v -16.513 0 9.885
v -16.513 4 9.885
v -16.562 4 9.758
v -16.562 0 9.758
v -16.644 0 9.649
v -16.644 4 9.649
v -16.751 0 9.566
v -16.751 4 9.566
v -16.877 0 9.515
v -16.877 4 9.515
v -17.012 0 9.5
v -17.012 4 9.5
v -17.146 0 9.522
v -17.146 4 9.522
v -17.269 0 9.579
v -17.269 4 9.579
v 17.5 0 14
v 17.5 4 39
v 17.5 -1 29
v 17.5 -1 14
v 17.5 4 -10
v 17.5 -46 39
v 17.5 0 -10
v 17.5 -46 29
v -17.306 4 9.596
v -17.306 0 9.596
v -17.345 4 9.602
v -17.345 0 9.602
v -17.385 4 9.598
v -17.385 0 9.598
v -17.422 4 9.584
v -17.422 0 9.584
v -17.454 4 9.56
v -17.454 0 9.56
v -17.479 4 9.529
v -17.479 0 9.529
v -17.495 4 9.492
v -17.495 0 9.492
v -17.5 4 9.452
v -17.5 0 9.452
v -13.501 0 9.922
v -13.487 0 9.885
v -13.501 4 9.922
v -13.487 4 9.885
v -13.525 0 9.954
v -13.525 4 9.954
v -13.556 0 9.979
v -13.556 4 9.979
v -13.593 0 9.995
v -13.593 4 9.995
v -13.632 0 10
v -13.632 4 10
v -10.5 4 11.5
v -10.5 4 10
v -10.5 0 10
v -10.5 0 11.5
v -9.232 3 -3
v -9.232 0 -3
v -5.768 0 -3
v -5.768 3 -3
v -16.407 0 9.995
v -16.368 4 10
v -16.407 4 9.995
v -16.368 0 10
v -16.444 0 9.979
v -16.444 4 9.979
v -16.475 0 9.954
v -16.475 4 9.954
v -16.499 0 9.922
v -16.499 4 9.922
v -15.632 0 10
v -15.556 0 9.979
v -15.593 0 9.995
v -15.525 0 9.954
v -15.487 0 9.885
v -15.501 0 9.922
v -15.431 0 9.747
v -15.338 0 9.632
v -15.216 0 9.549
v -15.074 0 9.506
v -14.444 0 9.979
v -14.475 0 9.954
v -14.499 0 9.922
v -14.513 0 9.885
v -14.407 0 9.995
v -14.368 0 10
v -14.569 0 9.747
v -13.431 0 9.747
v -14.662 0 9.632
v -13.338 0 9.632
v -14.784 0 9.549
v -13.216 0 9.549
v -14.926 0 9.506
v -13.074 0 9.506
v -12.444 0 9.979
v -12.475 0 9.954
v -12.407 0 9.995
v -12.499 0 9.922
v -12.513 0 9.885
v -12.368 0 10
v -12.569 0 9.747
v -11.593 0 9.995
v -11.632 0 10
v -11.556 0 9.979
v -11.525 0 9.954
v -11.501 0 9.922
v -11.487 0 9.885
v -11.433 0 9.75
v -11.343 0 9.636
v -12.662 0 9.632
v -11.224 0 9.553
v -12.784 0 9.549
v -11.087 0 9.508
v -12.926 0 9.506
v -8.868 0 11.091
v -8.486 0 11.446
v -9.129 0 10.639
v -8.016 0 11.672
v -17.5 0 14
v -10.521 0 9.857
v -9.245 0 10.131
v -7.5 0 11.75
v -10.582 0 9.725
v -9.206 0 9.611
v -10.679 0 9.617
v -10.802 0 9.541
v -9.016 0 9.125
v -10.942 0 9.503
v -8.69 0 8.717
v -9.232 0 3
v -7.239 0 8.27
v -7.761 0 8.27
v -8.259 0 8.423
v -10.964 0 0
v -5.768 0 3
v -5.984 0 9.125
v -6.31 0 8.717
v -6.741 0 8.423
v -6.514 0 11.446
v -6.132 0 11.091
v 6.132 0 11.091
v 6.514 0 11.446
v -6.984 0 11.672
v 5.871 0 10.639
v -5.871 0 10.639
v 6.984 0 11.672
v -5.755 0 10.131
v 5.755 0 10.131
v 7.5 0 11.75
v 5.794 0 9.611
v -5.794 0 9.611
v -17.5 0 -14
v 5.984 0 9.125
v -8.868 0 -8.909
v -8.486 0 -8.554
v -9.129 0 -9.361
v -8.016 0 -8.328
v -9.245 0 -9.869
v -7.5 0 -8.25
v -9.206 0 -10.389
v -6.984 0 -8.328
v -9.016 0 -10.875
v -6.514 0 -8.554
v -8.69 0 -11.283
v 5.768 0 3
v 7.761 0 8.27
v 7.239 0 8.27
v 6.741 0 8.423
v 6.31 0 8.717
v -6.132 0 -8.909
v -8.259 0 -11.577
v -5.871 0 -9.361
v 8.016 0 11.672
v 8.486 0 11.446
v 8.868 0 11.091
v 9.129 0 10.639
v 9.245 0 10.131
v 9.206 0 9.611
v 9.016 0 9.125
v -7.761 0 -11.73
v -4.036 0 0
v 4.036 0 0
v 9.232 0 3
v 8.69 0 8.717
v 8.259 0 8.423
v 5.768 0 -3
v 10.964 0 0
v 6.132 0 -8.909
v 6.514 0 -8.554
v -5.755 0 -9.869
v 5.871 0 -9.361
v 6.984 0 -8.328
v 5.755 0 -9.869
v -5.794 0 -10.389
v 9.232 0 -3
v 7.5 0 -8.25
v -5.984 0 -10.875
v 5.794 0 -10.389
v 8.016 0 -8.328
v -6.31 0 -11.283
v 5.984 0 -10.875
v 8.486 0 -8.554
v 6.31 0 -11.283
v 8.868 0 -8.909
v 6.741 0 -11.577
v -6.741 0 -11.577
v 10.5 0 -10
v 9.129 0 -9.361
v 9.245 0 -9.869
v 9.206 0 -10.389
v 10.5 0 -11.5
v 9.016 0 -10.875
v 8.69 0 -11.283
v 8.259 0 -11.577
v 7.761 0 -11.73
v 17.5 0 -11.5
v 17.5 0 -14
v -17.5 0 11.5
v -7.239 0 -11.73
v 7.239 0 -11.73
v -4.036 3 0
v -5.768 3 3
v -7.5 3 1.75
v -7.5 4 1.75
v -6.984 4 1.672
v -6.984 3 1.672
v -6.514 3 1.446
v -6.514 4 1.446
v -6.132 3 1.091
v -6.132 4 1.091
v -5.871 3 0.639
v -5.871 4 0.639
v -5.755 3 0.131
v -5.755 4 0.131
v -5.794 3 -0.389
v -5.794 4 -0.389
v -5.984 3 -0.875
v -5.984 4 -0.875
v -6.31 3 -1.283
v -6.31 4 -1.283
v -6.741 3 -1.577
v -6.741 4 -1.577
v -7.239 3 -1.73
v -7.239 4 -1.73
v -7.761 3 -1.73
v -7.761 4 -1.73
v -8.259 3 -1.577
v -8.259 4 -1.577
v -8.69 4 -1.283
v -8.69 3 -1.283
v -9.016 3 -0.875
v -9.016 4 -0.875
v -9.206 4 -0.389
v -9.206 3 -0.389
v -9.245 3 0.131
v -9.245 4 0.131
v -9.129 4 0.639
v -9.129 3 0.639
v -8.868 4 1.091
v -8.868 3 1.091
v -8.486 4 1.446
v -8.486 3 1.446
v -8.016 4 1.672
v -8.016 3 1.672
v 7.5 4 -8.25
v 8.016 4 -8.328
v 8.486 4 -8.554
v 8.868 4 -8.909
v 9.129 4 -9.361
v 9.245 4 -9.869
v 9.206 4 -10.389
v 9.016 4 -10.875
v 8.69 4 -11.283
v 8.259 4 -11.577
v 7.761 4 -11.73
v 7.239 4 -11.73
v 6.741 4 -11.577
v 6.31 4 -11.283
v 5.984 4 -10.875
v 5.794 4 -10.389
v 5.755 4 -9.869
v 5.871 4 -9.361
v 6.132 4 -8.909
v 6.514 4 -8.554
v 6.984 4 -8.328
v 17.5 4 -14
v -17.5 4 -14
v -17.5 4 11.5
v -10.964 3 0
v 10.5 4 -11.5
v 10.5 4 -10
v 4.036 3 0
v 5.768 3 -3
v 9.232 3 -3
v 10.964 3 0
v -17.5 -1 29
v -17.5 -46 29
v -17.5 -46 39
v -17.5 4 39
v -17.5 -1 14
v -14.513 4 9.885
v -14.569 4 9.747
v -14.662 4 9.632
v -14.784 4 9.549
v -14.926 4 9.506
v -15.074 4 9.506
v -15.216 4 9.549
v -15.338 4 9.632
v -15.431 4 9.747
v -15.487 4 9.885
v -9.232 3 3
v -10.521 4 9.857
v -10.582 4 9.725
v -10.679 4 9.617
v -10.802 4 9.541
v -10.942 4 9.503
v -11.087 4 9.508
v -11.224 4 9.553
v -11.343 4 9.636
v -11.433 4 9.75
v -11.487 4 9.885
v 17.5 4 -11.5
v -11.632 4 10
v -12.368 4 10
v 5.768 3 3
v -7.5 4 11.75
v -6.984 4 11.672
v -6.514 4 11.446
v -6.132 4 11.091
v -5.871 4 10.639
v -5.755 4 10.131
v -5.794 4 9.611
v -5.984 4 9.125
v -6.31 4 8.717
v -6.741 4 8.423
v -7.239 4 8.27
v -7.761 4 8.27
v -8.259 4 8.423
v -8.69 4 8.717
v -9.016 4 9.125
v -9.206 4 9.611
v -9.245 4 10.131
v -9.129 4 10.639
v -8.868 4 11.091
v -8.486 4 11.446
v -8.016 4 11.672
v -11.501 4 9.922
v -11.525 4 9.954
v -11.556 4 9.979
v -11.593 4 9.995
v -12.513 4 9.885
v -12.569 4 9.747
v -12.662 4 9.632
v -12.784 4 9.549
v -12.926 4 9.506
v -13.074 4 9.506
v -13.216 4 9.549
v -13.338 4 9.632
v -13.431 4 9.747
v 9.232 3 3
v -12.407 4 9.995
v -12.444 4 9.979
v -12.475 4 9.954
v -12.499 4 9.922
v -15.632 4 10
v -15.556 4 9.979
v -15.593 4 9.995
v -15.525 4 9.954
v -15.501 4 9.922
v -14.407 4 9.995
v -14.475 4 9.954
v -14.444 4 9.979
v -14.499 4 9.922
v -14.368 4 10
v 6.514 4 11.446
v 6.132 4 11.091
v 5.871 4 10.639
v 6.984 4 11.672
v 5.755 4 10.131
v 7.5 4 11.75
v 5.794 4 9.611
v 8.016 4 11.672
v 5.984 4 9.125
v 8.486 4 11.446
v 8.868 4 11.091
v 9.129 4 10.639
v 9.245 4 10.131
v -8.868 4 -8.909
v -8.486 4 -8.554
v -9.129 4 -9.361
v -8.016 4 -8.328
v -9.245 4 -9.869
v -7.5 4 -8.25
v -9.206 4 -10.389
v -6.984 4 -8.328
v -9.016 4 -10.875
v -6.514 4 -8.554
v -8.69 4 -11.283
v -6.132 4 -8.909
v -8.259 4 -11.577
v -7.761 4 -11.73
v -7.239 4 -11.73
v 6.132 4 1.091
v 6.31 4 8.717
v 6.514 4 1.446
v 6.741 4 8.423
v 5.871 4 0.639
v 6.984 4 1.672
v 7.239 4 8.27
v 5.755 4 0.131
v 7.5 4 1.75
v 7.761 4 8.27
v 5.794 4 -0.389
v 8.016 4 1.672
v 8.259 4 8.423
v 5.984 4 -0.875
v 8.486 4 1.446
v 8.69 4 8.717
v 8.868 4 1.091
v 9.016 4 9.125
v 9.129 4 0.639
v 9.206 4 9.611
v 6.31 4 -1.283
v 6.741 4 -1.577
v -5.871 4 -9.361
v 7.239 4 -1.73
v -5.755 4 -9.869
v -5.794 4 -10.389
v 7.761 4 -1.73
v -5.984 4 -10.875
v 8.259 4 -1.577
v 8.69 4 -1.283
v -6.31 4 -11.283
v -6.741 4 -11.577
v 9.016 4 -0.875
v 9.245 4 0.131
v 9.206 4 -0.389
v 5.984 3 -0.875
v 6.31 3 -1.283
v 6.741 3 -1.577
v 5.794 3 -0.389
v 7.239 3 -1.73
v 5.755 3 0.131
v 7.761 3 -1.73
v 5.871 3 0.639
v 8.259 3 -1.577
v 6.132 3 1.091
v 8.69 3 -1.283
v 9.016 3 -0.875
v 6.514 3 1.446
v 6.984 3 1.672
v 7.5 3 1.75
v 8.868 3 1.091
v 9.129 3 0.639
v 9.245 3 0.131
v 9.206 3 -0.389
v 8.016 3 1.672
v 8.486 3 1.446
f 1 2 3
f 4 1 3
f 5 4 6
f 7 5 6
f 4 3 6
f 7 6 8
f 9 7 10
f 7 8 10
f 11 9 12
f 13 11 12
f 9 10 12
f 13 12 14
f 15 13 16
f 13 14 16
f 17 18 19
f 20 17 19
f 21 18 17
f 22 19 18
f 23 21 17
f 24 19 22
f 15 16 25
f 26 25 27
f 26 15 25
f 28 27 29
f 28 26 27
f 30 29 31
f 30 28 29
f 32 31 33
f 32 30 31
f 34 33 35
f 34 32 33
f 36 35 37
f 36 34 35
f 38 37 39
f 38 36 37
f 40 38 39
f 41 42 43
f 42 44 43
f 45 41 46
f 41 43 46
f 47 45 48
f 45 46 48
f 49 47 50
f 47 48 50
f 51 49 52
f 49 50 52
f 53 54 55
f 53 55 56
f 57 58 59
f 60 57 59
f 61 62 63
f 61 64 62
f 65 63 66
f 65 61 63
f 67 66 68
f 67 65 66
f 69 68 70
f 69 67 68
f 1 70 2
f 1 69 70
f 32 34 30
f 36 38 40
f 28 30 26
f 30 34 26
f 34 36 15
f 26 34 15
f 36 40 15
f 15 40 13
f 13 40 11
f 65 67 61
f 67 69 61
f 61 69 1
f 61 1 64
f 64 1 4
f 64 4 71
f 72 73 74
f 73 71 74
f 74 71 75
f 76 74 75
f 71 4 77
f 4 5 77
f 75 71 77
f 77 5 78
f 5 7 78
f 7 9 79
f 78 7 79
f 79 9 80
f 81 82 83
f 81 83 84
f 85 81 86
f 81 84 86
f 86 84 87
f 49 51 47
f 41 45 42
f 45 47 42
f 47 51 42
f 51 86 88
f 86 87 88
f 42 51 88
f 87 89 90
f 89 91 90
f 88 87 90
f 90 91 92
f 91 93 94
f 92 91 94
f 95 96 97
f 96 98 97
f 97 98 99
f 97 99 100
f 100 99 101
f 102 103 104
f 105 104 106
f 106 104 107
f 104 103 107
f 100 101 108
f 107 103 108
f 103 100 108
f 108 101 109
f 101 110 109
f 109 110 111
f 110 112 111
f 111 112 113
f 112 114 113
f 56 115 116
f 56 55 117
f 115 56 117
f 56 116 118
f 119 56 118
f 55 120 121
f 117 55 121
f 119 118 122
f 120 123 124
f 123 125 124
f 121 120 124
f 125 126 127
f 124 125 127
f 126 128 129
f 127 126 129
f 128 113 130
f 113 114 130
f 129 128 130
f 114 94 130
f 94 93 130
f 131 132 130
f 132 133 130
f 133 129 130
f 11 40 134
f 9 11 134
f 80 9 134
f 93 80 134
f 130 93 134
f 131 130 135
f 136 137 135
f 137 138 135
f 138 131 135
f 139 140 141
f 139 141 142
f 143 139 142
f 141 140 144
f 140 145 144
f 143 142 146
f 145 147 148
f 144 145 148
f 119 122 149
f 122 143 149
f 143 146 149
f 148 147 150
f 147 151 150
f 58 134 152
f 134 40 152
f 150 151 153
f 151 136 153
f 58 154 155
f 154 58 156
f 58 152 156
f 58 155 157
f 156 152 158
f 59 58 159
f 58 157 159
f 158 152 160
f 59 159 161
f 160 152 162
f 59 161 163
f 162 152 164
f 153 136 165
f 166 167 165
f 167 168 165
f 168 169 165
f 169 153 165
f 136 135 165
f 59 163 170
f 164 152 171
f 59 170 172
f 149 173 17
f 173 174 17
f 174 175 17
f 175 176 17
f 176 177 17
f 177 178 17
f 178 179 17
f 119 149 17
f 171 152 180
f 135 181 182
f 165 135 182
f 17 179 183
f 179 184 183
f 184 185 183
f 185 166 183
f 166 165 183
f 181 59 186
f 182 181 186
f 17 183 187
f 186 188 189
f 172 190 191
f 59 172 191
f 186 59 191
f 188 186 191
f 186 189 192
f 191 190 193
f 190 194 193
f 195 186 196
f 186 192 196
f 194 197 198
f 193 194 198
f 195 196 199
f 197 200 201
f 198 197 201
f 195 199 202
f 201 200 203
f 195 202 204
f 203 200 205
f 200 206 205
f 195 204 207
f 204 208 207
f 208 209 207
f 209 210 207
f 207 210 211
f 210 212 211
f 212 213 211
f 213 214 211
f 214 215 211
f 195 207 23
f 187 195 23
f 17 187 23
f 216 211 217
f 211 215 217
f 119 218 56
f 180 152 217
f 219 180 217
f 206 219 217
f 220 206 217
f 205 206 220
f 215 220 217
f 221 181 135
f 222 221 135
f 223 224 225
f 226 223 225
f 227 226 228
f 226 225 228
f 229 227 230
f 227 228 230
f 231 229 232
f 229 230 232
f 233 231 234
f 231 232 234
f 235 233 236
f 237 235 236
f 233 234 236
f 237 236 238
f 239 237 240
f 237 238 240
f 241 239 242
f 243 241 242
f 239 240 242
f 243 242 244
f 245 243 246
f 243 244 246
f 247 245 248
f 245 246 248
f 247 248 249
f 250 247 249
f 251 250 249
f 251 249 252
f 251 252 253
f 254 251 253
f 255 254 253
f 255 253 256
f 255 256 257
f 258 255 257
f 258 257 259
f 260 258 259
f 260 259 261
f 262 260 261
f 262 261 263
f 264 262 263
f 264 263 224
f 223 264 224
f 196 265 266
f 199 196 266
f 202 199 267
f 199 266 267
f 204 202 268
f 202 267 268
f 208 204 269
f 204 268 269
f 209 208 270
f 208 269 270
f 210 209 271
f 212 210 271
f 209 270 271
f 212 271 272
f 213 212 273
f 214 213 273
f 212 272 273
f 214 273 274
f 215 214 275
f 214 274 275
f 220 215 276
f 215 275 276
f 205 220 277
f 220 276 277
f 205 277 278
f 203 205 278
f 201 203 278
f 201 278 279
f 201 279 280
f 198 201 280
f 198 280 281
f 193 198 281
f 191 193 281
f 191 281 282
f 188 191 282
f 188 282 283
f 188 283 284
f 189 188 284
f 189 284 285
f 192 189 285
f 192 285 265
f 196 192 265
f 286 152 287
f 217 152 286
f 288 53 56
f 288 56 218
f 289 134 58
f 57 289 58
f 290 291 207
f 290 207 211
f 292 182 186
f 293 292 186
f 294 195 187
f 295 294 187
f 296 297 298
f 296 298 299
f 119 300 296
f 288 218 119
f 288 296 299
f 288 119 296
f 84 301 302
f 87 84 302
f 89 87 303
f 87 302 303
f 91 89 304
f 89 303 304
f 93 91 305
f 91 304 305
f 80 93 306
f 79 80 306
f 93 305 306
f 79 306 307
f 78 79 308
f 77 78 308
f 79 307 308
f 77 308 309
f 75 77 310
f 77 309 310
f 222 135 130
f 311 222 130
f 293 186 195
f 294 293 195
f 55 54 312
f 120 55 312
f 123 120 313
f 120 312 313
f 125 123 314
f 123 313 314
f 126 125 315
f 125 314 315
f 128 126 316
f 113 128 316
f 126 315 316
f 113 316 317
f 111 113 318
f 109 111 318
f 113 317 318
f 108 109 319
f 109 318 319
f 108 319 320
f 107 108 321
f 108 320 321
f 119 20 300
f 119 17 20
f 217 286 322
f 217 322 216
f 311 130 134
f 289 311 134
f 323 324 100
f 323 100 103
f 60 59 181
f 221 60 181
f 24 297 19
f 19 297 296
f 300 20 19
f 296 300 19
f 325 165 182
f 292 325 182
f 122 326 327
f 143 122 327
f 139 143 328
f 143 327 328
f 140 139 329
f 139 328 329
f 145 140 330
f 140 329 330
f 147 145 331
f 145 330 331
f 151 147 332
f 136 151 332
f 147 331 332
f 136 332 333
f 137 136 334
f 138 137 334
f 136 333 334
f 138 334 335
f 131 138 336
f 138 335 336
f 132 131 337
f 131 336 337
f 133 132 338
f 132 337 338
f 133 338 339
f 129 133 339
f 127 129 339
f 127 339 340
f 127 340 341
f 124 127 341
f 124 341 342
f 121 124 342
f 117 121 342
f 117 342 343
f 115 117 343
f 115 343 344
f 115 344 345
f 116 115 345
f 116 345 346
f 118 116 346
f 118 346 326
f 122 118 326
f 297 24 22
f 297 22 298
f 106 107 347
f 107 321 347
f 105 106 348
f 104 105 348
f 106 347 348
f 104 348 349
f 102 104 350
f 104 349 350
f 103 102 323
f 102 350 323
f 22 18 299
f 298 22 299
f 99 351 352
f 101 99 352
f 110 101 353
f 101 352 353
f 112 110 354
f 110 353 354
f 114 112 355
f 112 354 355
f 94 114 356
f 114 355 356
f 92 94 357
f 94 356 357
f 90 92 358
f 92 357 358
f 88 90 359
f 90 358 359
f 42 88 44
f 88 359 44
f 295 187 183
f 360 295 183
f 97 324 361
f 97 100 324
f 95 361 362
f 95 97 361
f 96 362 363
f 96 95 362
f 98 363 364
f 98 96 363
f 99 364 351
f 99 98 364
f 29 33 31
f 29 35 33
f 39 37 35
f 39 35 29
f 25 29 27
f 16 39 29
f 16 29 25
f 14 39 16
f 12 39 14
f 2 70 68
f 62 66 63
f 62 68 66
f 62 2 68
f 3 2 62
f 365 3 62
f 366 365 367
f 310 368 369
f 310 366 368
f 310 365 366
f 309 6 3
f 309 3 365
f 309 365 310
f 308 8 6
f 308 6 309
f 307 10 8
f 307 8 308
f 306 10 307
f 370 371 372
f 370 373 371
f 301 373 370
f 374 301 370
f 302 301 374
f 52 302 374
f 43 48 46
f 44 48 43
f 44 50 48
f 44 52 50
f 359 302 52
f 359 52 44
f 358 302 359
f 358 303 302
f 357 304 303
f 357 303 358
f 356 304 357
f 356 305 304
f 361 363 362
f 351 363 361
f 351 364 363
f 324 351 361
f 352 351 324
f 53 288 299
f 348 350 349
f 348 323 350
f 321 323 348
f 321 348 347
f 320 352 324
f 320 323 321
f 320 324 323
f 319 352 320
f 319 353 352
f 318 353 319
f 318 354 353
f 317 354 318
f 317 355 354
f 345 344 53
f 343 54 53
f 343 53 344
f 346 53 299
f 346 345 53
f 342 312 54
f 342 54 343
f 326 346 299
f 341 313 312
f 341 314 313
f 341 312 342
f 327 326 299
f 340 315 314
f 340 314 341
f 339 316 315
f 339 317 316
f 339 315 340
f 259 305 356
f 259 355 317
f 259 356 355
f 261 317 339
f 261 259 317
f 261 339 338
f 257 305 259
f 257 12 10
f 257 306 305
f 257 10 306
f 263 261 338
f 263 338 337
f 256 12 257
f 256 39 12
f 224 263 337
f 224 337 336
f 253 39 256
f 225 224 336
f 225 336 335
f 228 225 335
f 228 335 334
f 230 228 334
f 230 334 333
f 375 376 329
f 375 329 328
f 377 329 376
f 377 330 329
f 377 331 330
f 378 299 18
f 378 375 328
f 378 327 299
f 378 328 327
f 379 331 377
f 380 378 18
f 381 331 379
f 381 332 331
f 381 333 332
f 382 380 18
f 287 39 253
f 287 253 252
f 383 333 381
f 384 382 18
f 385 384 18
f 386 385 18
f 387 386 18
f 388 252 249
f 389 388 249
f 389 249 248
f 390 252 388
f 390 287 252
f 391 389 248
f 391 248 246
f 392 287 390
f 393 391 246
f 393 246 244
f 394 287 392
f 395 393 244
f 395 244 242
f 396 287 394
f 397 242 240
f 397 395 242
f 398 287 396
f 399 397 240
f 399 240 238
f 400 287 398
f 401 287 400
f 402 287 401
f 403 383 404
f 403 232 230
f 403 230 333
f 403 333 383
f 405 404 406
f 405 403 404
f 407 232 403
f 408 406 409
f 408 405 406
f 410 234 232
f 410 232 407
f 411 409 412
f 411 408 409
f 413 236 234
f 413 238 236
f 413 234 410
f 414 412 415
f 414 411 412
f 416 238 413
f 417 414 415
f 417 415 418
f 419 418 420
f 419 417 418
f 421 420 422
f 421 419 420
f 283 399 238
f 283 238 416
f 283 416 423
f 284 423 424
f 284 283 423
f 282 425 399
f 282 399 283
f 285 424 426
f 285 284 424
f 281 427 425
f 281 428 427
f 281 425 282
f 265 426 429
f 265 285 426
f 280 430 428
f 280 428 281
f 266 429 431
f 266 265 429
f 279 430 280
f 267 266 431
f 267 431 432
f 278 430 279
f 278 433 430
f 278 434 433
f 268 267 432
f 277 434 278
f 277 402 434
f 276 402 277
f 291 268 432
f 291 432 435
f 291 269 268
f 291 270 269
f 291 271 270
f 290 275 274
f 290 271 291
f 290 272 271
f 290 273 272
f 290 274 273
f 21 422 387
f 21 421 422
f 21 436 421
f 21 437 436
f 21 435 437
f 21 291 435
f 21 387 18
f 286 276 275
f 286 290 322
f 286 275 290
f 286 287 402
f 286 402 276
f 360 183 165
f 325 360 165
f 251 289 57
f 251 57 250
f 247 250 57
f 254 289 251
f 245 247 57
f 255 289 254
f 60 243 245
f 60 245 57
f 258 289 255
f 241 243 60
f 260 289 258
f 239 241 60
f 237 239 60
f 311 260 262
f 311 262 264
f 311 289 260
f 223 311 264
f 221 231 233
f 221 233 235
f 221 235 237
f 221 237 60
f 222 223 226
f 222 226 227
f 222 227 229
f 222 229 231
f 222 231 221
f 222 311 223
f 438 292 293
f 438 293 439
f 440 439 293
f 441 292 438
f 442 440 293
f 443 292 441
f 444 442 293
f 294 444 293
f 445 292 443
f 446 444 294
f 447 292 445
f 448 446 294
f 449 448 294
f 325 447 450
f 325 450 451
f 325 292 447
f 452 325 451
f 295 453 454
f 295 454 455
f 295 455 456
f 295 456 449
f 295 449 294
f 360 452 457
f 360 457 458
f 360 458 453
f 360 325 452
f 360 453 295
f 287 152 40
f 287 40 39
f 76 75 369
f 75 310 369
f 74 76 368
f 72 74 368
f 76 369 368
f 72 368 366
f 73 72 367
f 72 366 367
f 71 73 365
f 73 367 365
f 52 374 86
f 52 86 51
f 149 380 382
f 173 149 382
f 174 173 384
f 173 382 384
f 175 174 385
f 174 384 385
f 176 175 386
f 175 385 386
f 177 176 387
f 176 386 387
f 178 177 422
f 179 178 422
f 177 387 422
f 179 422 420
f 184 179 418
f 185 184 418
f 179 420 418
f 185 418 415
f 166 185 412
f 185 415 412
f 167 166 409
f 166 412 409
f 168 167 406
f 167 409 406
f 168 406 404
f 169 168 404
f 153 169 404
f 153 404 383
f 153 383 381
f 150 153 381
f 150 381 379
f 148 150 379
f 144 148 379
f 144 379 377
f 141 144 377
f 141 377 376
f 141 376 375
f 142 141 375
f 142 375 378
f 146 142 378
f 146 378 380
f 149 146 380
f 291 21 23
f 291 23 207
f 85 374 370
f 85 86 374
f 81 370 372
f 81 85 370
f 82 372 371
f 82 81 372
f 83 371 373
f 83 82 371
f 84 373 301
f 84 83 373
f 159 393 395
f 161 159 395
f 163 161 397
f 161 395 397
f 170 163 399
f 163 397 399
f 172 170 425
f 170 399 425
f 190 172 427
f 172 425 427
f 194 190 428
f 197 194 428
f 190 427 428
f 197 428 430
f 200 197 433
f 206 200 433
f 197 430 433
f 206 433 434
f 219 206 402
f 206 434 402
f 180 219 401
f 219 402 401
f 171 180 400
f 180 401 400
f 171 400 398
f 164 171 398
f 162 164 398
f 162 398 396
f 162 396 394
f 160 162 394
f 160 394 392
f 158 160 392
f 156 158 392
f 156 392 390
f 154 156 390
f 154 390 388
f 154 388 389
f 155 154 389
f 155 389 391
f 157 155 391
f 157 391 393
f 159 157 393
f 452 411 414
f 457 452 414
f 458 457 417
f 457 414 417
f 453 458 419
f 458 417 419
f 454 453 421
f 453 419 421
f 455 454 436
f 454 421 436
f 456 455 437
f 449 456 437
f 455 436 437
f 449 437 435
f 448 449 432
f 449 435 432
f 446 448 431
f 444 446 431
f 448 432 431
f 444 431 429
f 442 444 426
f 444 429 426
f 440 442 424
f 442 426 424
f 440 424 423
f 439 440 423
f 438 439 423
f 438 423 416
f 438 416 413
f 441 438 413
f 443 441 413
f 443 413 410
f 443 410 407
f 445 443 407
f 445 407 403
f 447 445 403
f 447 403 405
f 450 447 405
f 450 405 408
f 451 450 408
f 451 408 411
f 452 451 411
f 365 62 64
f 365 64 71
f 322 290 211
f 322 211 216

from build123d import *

# Parameters (mm, degrees)
SKETCH1_W           = 35
SKETCH1_H           = 28.000000000000004
BOSS_EXTRUDE1_DEPTH = 4
SKETCH2_R           = 1.7499999999999998
CUT_EXTRUDE1_DEPTH  = 23.765104875664424
BOSS_EXTRUDE2_DEPTH = 25
CUT_EXTRUDE14_DEPTH = 66.78183639881149
SKETCH19_R          = 1.75
CUT_EXTRUDE15_DEPTH = 66.78183639881149
CUT_EXTRUDE16_DEPTH = 2.999999999999999
SKETCH21_R          = 0.49999999999999917
CUT_EXTRUDE17_DEPTH = 3.999999999999999
LPATTERN2_COUNT     = 4
LPATTERN2_PITCH     = 2
FILLET2_R           = 0.15
SKETCH22_W          = 14.999999999999995
SKETCH22_H          = 45
CUT_EXTRUDE18_DEPTH = 70.72804313904126


with BuildPart() as part:
    # Sketch1 → Boss-Extrude1 (new body)
    with BuildSketch(Plane(origin=(0, 0, 0), x_dir=(1, 0, 0), z_dir=(0, 1, 0))):
        Rectangle(SKETCH1_W, SKETCH1_H)
    extrude(amount=BOSS_EXTRUDE1_DEPTH)

    # Sketch2 → Cut-Extrude1 (cut, through all)
    with BuildSketch(Plane(origin=(0, 4, 0), x_dir=(1, 0, 0), z_dir=(0, 1, 0))):
        with Locations(Location((-7.499999999999998, -10, 0), (0, 0, 270))):
            Circle(SKETCH2_R)
        with Locations(Location((-7.499999999999998, 10, 0), (0, 0, 270))):
            Circle(SKETCH2_R)
        with Locations(Location((7.500000000000002, -10.000000000000002, 0), (0, 0, 270))):
            Circle(SKETCH2_R)
        with Locations(Location((7.500000000000002, 10, 0), (0, 0, 270))):
            Circle(SKETCH2_R)
    extrude(amount=-CUT_EXTRUDE1_DEPTH, mode=Mode.SUBTRACT)

    # Sketch3 → Boss-Extrude2 (add)
    with BuildSketch(Plane.XY.offset(14)):
        Polygon((-17.499999999999996, 4), (17.500000000000004, 4), (17.50000000000001, -46), (-17.499999999999993, -46), align=None)
    extrude(amount=BOSS_EXTRUDE2_DEPTH)

    # Sketch18 → Cut-Extrude14 (cut, through all)
    with BuildSketch(Plane(origin=(0, 4, 0), x_dir=(1, 0, 0), z_dir=(0, 1, 0))):
        Polygon((-17.499999999999996, -9.999999999999998), (-10.499999999999998, -10.000000000000002), (-10.499999999999998, -11.500000000000002), (-17.499999999999996, -11.500000000000004), align=None)
        Polygon((17.500000000000004, 10.000000000000002), (10.500000000000002, 10), (10.500000000000002, 11.5), (17.500000000000004, 11.500000000000004), align=None)
    extrude(amount=-CUT_EXTRUDE14_DEPTH, mode=Mode.SUBTRACT)

    # Sketch19 → Cut-Extrude15 (cut, through all)
    with BuildSketch(Plane(origin=(0, 4, 0), x_dir=(1, 0, 0), z_dir=(0, 1, 0))):
        with Locations(Location((-7.499999999999998, 0, 0), (0, 0, 270))):
            Circle(SKETCH19_R)
        with Locations(Location((7.500000000000005, 0, 0), (0, 0, 270))):
            Circle(SKETCH19_R)
    extrude(amount=-CUT_EXTRUDE15_DEPTH, mode=Mode.SUBTRACT)

    # Sketch20 → Cut-Extrude16 (cut)
    with BuildSketch(Plane.XZ):
        Polygon((10.96410161513776, 9.3e-16), (9.23205080756888, 2.9999999999999996), (5.767949192431128, 2.9999999999999987), (4.035898384862253, -1.5e-16), (5.767949192431131, -3), (9.232050807568884, -2.9999999999999996), align=None)
        Polygon((-10.964101615137752, 5.88e-15), (-9.232050807568879, -2.999999999999999), (-5.767949192431124, -3.000000000000003), (-4.035898384862242, -3.87e-15), (-5.7679491924311215, 3.000000000000001), (-9.232050807568873, 3.0000000000000053), align=None)
    extrude(amount=-CUT_EXTRUDE16_DEPTH, mode=Mode.SUBTRACT)

    # Sketch21 → Cut-Extrude17 (cut)
    with BuildSketch(Plane(origin=(0, 4, 0), x_dir=(1, 0, 0), z_dir=(0, 1, 0))):
        with Locations((-16.999999999999996, -10.000000000000002)):
            Circle(SKETCH21_R)
    cut_extrude17 = extrude(amount=-CUT_EXTRUDE17_DEPTH, mode=Mode.SUBTRACT)

    # LPattern2: Cut-Extrude17 ×4
    with Locations(*[(i * LPATTERN2_PITCH, 0, 0) for i in range(1, LPATTERN2_COUNT)]):
        add(cut_extrude17, mode=Mode.SUBTRACT)

    # Fillet2
    fillet2_edges = [part.edges().sort_by_distance(p)[0] for p in [
        (-16.499999999999996, 2.0000000000000004, 10.000000000000002),
        (-12.499999999999996, 2.0000000000000004, 10.000000000000005),
        (-13.499999999999996, 2, 10),
        (-14.499999999999996, 2.0000000000000004, 10.000000000000004),
        (-15.499999999999996, 2, 10),
        (-11.499999999999996, 2, 10.000000000000002),
        (-17.499999999999996, 2, 9.999999999999998),
    ]]
    fillet(fillet2_edges, radius=FILLET2_R)

    # Sketch22 → Cut-Extrude18 (cut, through all)
    with BuildSketch(Plane.ZY.offset(17.499999999999996)):
        with Locations((21.5, -23.5)):
            Rectangle(SKETCH22_W, SKETCH22_H)
    extrude(amount=-CUT_EXTRUDE18_DEPTH, mode=Mode.SUBTRACT)


solid = part.part
